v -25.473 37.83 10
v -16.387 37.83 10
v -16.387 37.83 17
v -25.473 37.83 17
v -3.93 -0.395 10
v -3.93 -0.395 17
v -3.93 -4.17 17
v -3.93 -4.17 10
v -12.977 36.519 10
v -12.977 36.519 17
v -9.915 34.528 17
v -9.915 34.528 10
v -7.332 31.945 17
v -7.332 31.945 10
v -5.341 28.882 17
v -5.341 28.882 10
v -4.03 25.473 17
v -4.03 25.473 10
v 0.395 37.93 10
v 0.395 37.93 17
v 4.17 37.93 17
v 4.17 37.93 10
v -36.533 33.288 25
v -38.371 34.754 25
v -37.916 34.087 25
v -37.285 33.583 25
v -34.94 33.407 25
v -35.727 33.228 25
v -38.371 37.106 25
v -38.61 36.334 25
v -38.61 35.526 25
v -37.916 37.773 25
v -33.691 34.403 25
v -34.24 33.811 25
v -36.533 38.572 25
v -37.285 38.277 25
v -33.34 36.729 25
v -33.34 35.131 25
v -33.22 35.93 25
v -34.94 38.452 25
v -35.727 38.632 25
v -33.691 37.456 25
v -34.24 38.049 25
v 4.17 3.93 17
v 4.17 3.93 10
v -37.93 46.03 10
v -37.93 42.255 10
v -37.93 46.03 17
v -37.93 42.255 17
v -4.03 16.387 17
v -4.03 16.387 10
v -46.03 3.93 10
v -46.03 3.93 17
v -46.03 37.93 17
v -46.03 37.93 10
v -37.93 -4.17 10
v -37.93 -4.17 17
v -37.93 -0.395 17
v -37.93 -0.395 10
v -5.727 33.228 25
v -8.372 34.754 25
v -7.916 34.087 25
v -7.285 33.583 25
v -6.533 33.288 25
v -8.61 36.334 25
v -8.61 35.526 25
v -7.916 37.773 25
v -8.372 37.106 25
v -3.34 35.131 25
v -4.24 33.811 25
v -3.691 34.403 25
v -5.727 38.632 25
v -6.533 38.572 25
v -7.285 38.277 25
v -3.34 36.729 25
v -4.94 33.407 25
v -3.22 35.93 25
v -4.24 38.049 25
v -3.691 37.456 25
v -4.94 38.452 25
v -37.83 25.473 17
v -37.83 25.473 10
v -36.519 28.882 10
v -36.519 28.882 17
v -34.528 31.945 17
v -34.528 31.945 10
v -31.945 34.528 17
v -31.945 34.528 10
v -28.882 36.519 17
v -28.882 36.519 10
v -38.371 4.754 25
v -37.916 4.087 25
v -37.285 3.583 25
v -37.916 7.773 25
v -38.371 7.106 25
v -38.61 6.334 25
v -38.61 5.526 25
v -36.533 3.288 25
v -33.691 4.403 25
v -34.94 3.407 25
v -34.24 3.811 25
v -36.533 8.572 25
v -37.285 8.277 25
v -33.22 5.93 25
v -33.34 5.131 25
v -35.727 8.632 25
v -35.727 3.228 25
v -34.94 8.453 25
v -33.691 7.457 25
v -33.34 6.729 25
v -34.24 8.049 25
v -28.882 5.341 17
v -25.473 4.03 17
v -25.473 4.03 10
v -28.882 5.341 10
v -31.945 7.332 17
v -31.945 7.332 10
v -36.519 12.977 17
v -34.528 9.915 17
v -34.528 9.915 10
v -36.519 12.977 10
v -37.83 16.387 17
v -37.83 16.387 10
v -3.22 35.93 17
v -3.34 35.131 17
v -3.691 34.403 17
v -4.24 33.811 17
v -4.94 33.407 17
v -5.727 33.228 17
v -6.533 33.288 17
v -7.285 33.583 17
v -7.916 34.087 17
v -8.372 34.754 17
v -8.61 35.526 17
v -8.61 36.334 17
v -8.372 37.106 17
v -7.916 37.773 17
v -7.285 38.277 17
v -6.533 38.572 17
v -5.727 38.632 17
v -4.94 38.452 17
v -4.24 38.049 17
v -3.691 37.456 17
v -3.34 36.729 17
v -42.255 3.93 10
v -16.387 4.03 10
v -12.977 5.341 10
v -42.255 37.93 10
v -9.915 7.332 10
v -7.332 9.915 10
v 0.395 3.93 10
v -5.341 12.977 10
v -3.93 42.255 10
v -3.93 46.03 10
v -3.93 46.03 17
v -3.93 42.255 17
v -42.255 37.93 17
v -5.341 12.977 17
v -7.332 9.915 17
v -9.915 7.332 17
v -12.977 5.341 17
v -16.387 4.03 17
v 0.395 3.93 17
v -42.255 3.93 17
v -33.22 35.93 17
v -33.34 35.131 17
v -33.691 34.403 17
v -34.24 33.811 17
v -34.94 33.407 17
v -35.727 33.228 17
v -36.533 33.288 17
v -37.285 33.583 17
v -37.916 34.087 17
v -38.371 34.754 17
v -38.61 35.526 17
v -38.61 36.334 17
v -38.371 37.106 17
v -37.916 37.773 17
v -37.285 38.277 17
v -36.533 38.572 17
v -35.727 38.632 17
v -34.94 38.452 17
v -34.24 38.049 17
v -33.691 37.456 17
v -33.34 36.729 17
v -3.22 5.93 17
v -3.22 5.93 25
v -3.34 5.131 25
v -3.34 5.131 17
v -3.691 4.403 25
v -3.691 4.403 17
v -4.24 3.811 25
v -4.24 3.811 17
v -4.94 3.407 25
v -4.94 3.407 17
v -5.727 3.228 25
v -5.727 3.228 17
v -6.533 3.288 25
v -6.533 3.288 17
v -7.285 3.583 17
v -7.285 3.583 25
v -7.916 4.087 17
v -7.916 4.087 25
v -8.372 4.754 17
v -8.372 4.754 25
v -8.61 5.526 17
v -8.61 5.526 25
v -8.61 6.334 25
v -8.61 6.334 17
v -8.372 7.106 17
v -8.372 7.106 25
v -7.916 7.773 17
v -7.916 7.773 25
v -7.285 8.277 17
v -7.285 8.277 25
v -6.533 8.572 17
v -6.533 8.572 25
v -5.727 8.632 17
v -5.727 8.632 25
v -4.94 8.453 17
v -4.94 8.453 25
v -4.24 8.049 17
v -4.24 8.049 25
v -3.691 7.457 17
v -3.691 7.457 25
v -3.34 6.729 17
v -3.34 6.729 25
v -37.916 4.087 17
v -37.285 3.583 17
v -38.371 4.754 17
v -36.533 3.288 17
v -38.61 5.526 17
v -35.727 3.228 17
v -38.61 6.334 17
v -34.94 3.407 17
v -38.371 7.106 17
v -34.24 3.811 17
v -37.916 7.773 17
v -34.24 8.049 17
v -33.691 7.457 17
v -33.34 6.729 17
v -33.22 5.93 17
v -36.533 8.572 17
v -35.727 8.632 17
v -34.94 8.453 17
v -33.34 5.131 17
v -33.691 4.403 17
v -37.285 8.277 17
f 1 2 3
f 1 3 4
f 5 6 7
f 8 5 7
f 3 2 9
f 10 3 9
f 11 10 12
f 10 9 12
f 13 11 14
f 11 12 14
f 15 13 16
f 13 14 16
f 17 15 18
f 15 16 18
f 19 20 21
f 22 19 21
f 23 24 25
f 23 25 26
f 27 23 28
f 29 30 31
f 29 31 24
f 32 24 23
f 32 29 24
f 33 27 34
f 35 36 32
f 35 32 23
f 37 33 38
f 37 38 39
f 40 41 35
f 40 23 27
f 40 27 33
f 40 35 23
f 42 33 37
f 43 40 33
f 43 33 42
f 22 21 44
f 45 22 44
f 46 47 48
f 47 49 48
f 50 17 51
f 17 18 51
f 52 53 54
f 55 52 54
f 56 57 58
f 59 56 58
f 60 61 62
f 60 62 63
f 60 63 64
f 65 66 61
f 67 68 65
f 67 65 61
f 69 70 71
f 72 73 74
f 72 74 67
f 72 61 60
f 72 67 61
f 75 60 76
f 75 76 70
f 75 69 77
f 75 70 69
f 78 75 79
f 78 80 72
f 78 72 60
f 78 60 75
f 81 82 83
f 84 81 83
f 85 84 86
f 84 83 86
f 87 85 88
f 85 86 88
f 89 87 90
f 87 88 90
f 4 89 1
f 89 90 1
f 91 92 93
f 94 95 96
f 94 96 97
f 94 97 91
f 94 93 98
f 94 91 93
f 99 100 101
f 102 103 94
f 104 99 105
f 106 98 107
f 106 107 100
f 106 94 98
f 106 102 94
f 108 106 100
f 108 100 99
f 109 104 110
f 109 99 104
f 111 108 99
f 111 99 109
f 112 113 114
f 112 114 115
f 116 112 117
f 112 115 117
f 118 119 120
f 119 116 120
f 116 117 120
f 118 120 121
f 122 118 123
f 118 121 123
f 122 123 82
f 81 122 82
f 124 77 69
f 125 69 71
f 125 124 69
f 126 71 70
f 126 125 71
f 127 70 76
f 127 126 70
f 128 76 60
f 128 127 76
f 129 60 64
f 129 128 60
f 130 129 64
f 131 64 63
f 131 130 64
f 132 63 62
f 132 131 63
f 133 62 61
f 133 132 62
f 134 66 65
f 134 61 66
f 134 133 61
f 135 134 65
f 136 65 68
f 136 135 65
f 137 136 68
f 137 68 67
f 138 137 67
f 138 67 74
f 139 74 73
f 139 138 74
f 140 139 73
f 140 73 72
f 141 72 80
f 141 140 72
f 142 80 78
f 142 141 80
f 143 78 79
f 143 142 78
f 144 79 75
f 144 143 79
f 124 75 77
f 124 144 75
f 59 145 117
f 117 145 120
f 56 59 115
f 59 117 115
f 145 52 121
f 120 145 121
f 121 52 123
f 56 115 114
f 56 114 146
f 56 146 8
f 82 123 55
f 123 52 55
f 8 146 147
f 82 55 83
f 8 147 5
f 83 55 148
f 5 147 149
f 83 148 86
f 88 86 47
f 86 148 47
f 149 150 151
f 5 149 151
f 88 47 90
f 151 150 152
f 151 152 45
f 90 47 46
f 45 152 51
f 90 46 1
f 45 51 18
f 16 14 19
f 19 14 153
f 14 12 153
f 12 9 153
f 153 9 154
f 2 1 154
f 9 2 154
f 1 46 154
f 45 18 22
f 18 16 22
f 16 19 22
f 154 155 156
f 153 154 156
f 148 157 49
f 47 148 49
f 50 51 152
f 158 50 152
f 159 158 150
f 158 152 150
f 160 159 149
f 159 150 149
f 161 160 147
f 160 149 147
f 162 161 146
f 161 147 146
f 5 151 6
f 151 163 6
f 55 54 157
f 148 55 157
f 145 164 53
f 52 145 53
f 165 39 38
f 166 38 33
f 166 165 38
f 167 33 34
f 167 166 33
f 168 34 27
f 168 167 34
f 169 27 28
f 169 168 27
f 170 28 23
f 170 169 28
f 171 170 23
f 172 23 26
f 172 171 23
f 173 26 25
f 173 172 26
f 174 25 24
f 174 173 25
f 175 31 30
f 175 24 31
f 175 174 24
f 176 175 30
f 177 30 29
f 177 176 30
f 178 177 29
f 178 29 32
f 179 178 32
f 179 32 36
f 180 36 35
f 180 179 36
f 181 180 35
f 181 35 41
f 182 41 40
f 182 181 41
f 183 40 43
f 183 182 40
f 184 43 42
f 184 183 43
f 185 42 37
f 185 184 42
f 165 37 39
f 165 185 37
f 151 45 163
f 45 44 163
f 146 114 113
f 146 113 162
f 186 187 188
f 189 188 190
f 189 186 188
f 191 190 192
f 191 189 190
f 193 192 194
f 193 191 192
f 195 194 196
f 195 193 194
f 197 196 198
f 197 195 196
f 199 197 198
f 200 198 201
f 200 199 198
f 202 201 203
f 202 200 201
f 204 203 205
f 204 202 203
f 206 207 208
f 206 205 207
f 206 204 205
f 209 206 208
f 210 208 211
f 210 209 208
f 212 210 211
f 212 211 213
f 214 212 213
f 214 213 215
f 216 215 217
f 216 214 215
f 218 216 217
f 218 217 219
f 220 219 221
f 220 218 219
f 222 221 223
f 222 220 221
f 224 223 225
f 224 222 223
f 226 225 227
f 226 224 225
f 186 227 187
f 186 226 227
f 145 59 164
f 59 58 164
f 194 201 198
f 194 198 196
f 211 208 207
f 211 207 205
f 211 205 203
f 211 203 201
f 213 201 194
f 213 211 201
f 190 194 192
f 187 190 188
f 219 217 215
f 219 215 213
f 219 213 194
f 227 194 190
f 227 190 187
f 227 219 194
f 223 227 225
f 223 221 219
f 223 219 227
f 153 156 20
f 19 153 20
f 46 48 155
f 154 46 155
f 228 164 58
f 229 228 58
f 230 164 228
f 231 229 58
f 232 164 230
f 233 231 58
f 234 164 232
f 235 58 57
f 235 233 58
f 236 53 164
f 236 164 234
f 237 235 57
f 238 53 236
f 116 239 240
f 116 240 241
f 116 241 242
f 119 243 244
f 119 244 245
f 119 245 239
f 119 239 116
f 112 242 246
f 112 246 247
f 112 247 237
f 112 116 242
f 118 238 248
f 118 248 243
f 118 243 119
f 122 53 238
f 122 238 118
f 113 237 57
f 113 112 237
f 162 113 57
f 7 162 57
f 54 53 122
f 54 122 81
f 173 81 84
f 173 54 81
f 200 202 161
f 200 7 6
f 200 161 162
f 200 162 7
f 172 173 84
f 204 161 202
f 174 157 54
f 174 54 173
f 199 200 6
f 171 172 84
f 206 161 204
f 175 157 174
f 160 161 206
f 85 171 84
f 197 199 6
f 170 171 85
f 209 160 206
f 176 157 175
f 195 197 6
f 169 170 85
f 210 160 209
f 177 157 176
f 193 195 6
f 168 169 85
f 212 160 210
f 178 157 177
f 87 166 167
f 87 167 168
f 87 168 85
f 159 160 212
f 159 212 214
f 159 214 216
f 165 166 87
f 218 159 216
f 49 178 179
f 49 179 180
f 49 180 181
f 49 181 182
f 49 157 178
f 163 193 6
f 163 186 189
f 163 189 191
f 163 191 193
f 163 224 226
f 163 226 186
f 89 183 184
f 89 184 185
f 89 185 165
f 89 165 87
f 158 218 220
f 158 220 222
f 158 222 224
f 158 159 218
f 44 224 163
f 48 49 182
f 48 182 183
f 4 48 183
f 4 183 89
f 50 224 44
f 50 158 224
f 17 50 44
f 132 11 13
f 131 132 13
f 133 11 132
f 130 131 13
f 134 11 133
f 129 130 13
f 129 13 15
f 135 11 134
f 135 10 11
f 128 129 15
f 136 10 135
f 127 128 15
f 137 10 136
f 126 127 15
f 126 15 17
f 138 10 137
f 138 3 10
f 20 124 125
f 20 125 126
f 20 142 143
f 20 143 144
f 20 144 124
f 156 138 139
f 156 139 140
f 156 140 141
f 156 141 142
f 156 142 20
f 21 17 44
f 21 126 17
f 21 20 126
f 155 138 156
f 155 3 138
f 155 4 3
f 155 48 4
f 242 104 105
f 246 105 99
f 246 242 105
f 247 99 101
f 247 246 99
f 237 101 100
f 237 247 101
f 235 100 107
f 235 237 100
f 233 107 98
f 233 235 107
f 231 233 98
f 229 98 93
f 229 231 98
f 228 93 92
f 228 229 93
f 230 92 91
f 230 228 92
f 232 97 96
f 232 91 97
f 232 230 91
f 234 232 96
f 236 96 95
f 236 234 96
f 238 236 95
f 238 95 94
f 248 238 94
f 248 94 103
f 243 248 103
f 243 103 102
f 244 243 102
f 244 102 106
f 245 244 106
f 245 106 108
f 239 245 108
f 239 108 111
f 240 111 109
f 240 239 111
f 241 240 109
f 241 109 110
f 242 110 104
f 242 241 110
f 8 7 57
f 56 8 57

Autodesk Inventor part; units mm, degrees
ref_plane "YZ Plane" through (0, 0, 0) normal (1, 0, 0) x (0, 1, 0)
ref_plane "XZ Plane" through (0, 0, 0) normal (0, 1, 0) x (-1, 0, 0)
ref_plane "Work Plane1" through (0, 0, 10) normal (0, 0, 1) x (1, 0, 0)
sketch "Sketch1" plane through (0, 0, 10) normal (0, 0, 1) x (1, 0, 0)
  line L0 (-4.0299, -0.3538) -> (-2.2322, 1.4439) construction
  arc A0 (-1.4439, 2.2322) -> (-2.2322, 1.4439) centre (-0.9299, 0.9299) ccw construction
  line L1 (-1.4439, 2.2322) -> (0.3538, 4.0299) construction
  line L2 (-37.8299, 42.8299) -> (-37.8299, 37.8299) construction
  line L3 (-37.8299, 37.8299) -> (-42.9208, 37.8299) construction
  line L4 (-37.8299, 42.2137) -> (-37.8299, 45.8299) construction
  line L5 (-37.8299, 45.8299) -> (-4.0299, 45.8299) construction
  line L6 (-4.0299, 45.8299) -> (-4.0299, 42.2137) construction
  line L7 (-4.0299, 4.0299) -> (0.3538, 4.0299) projected
  circle A1 centre (-20.9299, 20.9299) radius 17.5 projected
  line L8 (-20.9299, 58.9723) -> (17.1124, 20.9299) construction
  line L9 (17.1124, 20.9299) -> (-20.9299, -17.1124) construction
  line L10 (-20.9299, -17.1124) -> (-58.9723, 20.9299) construction
  line L11 (-58.9723, 20.9299) -> (-20.9299, 58.9723) construction
  line L12 (-20.9299, 58.9723) -> (-20.9299, -17.1124) construction
  line L13 (17.1124, 20.9299) -> (-58.9723, 20.9299) construction
  line L14 (-20.9299, 58.9723) -> (32.8701, 58.9723) construction
  line L15 (-43.4299, 43.4299) -> (1.5701, 43.4299) construction
  line L16 (1.5701, 43.4299) -> (1.5701, -1.5701) construction
  line L17 (1.5701, -1.5701) -> (-43.4299, -1.5701) construction
  line L18 (-43.4299, -1.5701) -> (-43.4299, 43.4299) construction
  line L19 (-43.4299, 43.4299) -> (1.5701, -1.5701) construction
  line L20 (1.5701, 43.4299) -> (-43.4299, -1.5701) construction
  line L21 (-43.4299, 5.3876) -> (-43.4299, 36.4723)
  line L22 (-43.4299, 36.4723) -> (-36.4723, 43.4299)
  line L23 (-36.4723, 43.4299) -> (-5.3876, 43.4299)
  line L24 (-5.3876, 43.4299) -> (1.5701, 36.4723)
  line L25 (1.5701, 36.4723) -> (1.5701, 5.3876)
  line L26 (1.5701, 5.3876) -> (-5.3876, -1.5701)
  line L27 (-5.3876, -1.5701) -> (-36.4723, -1.5701)
  line L28 (-36.4723, -1.5701) -> (-43.4299, 5.3876)
  line L29 (-4.0299, 42.2137) -> (-37.8299, 42.2137) projected
  line L30 (-4.0299, -0.3538) -> (-4.0299, 4.0299) projected
  point P0 (-37.8299, 4.0299)
  point P1 (-20.9299, 20.9299)
  dimension "d18" = 53.8
  dimension "d19" = 45
  dimension "d20" = 53.8
  dimension "d21" = 45
  dimension "d22" = 45
extrude "Extrusion1" add sketch "Sketch1" along normal blind 7
sketch "Sketch2" plane through (0, 0, 17) normal (0, 0, 1) x (1, 0, 0)
  circle A0 centre (-35.9299, 35.9299) radius 3.0099 construction
  circle A1 centre (-5.93, 35.9299) radius 3.0099 construction
  circle A2 centre (-5.93, 5.93) radius 3.0099 construction
  circle A3 centre (-35.9299, 5.93) radius 3.0099 construction
  circle A4 centre (-35.9299, 35.9299) radius 2.7099
  circle A5 centre (-5.93, 35.9299) radius 2.7099
  circle A6 centre (-5.93, 5.93) radius 2.7099
  circle A7 centre (-35.9299, 5.93) radius 2.7099
  point P0 (0, 0)
  dimension "d_1" = 0.3
  dimension "d13" = 0.3
  dimension "d14" = 0.3
  dimension "d15" = 0.3
ref_plane "Work Plane2" through (-40.9959, 0.8639, 22.2359) normal (0, 0, 1) x (1, 0, 0)
extrude "Extrusion2" add sketch "Sketch2" along normal blind 8
sketch "Sketch3" plane through (0, 0, 10) normal (0, 0, -1) x (-1, 0, 0)
  line L0 (37.8299, -0.4701) -> (37.8299, 4.0299) construction
  line L1 (4.0299, 4.0299) -> (4.0299, -0.4701) construction
  line L2 (37.8299, -0.4701) -> (37.8299, 1.1886) construction
  line L3 (4.0299, -3.9701) -> (4.0299, -0.3538) construction
  line L4 (45.8299, 4.0299) -> (42.2137, 4.0299) construction
  line L5 (-0.3538, 4.0299) -> (-3.9701, 4.0299) construction
  line L6 (-3.9701, 37.8299) -> (-0.3538, 37.8299) construction
  line L7 (4.0299, 42.2137) -> (4.0299, 45.8299) construction
  line L8 (37.8299, 45.8299) -> (37.8299, 42.2137) construction
  line L9 (42.2137, 37.8299) -> (45.8299, 37.8299) construction
  line L10 (37.8299, 37.7299) -> (45.8299, 37.7299)
  line L11 (45.8299, 37.7299) -> (45.8299, 4.1299)
  line L12 (45.8299, 4.1299) -> (37.8299, 4.1299)
  line L13 (37.8299, 4.1299) -> (37.8299, 37.7299)
  line L14 (37.7299, 4.0299) -> (4.1299, 4.0299)
  line L15 (4.1299, 4.0299) -> (4.1299, -3.9701)
  line L16 (4.1299, -3.9701) -> (37.7299, -3.9701)
  line L17 (37.7299, -3.9701) -> (37.7299, 4.0299)
  line L18 (4.0299, 4.1299) -> (-3.9701, 4.1299)
  line L19 (-3.9701, 4.1299) -> (-3.9701, 37.7299)
  line L20 (-3.9701, 37.7299) -> (4.0299, 37.7299)
  line L21 (4.0299, 37.7299) -> (4.0299, 4.1299)
  line L22 (4.1299, 37.8299) -> (37.7299, 37.8299)
  line L23 (37.7299, 37.8299) -> (37.7299, 45.8299)
  line L24 (37.7299, 45.8299) -> (4.1299, 45.8299)
  line L25 (4.1299, 45.8299) -> (4.1299, 37.8299)
  point P0 (0, 0)
  dimension "d23" = 0.1
  dimension "d24" = 0.1
  dimension "d25" = 0.1
  dimension "d26" = 0.1
  dimension "d27" = 0.1
extrude "Extrusion3" add sketch "Sketch3" against normal up to surface (7 mm away)
sketch "Sketch4" plane through (0, 0, 17) normal (0, 0, 1) x (1, 0, 0)
  arc A0 (-16.3868, 4.0299) -> (-4.0299, 16.3868) centre (-20.9299, 20.9299) ccw projected
  line L0 (-25.4731, 4.0299) -> (-16.3868, 4.0299) projected
  arc A1 (-37.8299, 16.3868) -> (-25.4731, 4.0299) centre (-20.9299, 20.9299) ccw projected
  line L1 (-37.8299, 25.4731) -> (-37.8299, 16.3868) projected
  arc A2 (-25.4731, 37.8299) -> (-37.8299, 25.4731) centre (-20.9299, 20.9299) ccw projected
  line L2 (-16.3868, 37.8299) -> (-25.4731, 37.8299) projected
  arc A3 (-4.0299, 25.4731) -> (-16.3868, 37.8299) centre (-20.9299, 20.9299) ccw projected
  line L3 (-4.0299, 16.3868) -> (-4.0299, 25.4731) projected
  circle A4 centre (-5.93, 5.93) radius 2.7099 projected
  circle A5 centre (-5.93, 35.9299) radius 2.7099 projected
  circle A6 centre (-35.9299, 35.9299) radius 2.7099 projected
  circle A7 centre (-35.9299, 5.93) radius 2.7099 projected
  line L4 (3.9701, 4.1299) -> (0.3124, 4.1299) projected
  line L5 (3.9701, 37.7299) -> (3.9701, 4.1299) projected
  line L6 (0.3124, 37.7299) -> (3.9701, 37.7299) projected
  line L7 (0.3124, 37.7299) -> (-4.1299, 42.1723) projected
  line L8 (-4.1299, 45.8299) -> (-4.1299, 42.1723) projected
  line L9 (-37.7299, 45.8299) -> (-4.1299, 45.8299) projected
  line L10 (-37.7299, 42.1723) -> (-37.7299, 45.8299) projected
  line L11 (-37.7299, 42.1723) -> (-42.1723, 37.7299) projected
  line L12 (-45.8299, 37.7299) -> (-42.1723, 37.7299) projected
  line L13 (-45.8299, 4.1299) -> (-45.8299, 37.7299) projected
  line L14 (-42.1723, 4.1299) -> (-45.8299, 4.1299) projected
  line L15 (-42.1723, 4.1299) -> (-37.7299, -0.3124) projected
  line L16 (-37.7299, -3.9701) -> (-37.7299, -0.3124) projected
  line L17 (-4.1299, -3.9701) -> (-37.7299, -3.9701) projected
  line L18 (-4.1299, -0.3124) -> (-4.1299, -3.9701) projected
  line L19 (-4.1299, -0.3124) -> (0.3124, 4.1299) projected
  line L20 (-3.9299, 46.0299) -> (-3.9299, 42.2551)
  line L21 (-3.9299, 42.2551) -> (0.3953, 37.9299)
  line L22 (0.3953, 37.9299) -> (4.1701, 37.9299)
  line L23 (4.1701, 37.9299) -> (4.1701, 3.9299)
  line L24 (4.1701, 3.9299) -> (0.3953, 3.9299)
  line L25 (0.3953, 3.9299) -> (-3.9299, -0.3953)
  line L26 (-3.9299, -0.3953) -> (-3.9299, -4.1701)
  line L27 (-3.9299, -4.1701) -> (-37.9299, -4.1701)
  line L28 (-37.9299, -4.1701) -> (-37.9299, -0.3953)
  line L29 (-37.9299, -0.3953) -> (-42.2551, 3.9299)
  line L30 (-42.2551, 3.9299) -> (-46.0299, 3.9299)
  line L31 (-46.0299, 3.9299) -> (-46.0299, 37.9299)
  line L32 (-46.0299, 37.9299) -> (-42.2551, 37.9299)
  line L33 (-42.2551, 37.9299) -> (-37.9299, 42.2551)
  line L34 (-37.9299, 42.2551) -> (-37.9299, 46.0299)
  line L35 (-37.9299, 46.0299) -> (-3.9299, 46.0299)
  point P0 (0, 0)
  dimension "d30" = 0.2
extrude "Extrusion4" add sketch "Sketch4" against normal up to surface (7 mm away) contours L20 L21 L22 L23 L24 L25 L26 L27 L28 L29 L30 L31 L32 L33 L34 L35
equation "\"d13\" = d_1"
equation "\"d14\" = d_1"
equation "\"d15\" = d_1"
properties part number "50_Cube_Insert_Thorlabs"
